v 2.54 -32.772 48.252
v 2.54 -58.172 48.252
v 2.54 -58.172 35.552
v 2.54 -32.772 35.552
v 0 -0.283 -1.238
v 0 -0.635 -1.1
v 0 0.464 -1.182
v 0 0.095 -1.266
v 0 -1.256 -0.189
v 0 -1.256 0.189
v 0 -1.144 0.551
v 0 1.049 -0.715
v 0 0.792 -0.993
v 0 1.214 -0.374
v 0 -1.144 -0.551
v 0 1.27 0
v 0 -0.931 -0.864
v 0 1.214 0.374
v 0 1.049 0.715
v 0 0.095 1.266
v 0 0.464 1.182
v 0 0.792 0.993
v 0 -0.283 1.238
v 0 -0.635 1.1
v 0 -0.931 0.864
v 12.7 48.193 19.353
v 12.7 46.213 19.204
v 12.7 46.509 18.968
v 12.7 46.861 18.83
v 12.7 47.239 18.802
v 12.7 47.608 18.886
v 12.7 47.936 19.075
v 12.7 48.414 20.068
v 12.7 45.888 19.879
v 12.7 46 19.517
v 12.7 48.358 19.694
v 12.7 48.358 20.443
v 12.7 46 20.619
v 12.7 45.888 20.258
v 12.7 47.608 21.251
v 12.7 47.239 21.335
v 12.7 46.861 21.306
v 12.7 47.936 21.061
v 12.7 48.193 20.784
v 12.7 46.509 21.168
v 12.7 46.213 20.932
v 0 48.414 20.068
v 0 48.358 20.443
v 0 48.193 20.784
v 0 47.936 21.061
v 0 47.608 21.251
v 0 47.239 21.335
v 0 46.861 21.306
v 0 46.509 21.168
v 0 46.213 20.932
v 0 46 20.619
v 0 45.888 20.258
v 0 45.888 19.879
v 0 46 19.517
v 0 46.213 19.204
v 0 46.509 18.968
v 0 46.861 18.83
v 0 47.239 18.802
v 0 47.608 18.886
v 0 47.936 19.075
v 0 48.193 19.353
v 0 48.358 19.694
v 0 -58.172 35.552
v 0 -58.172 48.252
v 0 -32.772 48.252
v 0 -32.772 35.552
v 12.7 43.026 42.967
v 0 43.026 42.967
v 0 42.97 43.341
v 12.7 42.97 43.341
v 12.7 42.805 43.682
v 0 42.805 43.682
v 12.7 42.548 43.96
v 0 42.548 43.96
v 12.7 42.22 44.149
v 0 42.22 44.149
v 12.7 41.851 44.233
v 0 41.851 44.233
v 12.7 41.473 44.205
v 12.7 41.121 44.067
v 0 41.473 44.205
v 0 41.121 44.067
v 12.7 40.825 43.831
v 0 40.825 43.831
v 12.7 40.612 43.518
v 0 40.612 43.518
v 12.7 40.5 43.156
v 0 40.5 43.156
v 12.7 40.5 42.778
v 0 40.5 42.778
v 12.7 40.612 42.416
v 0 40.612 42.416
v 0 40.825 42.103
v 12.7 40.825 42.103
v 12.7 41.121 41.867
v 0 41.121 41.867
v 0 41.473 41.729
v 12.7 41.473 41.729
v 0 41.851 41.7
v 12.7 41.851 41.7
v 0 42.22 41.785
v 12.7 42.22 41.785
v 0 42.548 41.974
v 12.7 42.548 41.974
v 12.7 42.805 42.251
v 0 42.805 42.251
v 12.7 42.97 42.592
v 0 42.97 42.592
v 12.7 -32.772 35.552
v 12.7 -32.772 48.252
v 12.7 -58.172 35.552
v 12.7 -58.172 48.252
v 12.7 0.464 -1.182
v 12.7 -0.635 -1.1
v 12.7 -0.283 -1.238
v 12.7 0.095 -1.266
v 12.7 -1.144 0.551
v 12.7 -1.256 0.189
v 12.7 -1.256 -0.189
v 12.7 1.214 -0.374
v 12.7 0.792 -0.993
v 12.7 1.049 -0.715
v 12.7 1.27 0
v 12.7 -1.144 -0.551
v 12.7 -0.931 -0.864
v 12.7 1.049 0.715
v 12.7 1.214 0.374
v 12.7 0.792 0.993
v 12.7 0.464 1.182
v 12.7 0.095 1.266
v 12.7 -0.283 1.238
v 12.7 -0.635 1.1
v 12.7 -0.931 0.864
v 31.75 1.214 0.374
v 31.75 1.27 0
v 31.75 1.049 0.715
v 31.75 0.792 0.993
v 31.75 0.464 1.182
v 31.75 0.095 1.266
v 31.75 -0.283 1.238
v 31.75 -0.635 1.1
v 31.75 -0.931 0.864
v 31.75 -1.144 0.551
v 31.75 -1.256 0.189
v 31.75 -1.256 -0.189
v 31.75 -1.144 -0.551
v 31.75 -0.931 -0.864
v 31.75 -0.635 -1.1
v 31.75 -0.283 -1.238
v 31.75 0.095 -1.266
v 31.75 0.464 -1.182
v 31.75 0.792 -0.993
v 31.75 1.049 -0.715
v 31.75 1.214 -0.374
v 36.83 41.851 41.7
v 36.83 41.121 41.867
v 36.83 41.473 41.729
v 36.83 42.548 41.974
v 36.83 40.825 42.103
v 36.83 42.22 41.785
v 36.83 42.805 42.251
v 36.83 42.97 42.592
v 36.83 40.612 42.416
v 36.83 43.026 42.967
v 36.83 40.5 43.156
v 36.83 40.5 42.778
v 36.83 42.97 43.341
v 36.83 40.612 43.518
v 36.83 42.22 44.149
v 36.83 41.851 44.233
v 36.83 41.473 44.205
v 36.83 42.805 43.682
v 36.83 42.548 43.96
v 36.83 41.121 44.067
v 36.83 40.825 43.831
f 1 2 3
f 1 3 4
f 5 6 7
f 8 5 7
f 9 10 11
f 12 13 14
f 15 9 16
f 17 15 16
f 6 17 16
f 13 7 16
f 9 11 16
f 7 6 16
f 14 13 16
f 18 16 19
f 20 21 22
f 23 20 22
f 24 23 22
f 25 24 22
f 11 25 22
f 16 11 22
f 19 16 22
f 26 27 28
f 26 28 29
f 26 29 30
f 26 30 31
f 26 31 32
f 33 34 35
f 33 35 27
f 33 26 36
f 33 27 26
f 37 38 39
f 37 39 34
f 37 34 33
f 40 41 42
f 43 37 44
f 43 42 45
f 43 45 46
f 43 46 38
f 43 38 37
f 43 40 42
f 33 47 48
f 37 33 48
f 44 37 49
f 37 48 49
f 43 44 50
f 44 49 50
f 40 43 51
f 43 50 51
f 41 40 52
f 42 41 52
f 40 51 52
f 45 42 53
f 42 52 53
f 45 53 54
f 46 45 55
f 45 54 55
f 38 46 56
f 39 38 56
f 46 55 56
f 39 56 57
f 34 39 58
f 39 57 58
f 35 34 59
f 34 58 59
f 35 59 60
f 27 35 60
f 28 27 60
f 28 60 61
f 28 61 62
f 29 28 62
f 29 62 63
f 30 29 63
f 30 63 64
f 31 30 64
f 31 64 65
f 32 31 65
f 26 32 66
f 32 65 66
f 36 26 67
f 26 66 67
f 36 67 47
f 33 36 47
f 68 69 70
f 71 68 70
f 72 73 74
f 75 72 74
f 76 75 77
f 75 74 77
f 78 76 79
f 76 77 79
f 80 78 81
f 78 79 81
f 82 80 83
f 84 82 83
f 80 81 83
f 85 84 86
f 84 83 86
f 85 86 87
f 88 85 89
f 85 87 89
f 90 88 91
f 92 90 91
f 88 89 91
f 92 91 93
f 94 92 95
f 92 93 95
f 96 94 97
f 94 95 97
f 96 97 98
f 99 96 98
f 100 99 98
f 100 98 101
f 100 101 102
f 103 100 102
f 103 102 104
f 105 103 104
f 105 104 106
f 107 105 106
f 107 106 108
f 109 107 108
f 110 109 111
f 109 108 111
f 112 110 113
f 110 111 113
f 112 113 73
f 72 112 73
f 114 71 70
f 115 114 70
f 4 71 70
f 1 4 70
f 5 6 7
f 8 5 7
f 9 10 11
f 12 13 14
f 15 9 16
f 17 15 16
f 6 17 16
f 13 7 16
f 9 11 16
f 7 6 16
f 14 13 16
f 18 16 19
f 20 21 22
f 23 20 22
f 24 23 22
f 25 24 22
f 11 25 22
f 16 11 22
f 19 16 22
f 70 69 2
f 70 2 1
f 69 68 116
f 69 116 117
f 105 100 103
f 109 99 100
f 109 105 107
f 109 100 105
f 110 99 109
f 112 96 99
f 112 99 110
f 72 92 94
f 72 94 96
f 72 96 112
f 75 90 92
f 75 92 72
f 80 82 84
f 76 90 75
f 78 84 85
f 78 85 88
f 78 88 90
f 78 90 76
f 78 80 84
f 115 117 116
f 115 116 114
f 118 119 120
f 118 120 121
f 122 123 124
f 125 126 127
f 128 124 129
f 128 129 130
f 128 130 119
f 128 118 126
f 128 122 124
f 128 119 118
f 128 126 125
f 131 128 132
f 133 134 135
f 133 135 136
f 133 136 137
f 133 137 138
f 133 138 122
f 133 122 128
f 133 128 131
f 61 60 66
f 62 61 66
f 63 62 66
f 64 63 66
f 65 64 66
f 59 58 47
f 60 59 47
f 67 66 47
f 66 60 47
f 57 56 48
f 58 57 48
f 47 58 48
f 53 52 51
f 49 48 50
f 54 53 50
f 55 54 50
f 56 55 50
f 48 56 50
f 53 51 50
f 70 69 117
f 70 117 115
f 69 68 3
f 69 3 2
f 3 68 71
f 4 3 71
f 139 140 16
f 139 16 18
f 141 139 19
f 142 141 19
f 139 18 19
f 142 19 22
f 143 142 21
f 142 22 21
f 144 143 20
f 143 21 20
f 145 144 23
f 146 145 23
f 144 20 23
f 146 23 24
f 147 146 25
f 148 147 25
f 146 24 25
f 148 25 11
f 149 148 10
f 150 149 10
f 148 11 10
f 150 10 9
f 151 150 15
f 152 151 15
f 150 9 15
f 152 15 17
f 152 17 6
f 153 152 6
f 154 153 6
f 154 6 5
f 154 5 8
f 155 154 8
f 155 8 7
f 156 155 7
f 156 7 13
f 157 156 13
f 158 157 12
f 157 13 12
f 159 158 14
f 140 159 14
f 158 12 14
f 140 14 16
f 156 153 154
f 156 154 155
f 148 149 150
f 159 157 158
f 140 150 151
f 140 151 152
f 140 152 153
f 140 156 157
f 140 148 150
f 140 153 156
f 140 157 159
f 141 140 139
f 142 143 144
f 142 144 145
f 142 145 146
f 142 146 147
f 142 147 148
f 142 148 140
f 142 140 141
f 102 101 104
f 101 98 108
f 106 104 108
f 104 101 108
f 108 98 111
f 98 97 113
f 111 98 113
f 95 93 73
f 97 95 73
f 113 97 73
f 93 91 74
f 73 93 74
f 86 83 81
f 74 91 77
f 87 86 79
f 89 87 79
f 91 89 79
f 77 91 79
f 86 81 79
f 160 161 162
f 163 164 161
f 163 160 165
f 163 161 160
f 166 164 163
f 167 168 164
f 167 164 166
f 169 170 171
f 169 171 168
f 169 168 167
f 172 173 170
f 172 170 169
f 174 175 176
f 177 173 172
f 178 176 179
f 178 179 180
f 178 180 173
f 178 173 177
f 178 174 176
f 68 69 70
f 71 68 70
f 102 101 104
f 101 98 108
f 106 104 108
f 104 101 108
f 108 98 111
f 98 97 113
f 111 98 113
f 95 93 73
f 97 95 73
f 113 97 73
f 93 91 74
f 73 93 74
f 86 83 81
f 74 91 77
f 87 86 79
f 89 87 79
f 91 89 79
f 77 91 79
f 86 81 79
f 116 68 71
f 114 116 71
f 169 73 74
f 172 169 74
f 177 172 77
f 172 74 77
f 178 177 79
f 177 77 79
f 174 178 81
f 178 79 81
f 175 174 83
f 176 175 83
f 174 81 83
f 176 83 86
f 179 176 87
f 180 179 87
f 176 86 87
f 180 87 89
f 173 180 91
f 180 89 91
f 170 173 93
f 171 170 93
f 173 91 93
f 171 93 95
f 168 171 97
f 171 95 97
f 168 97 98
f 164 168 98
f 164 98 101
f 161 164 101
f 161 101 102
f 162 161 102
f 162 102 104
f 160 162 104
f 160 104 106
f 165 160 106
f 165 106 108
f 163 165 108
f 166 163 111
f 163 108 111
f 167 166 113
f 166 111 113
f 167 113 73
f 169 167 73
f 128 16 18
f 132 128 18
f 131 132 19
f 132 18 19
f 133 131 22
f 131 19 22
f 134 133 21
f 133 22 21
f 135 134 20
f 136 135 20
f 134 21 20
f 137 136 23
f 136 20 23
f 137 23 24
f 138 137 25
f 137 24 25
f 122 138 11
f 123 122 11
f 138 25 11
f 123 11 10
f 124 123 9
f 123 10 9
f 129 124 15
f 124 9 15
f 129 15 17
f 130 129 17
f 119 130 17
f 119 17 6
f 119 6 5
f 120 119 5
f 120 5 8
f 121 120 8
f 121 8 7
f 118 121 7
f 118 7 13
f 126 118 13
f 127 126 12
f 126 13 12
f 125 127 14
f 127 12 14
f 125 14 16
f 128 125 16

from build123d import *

# Parameters (mm, degrees)
F0_R     = 1.27
F1_DEPTH = 31.75
F2_DEPTH = 36.83
F0_W     = 25.4
F0_H     = 12.7
F3_DEPTH = 2.54
F4_DEPTH = 12.7


with BuildPart() as f1:
    # F0 (on Right) → F1 (new body)
    with BuildSketch(Plane.YZ):
        Circle(F0_R)
    extrude(amount=F1_DEPTH)


with BuildPart() as f2:
    # F0 (on Right) → F2 (new body)
    with BuildSketch(Plane.YZ):
        with Locations((41.75606, 42.966802)):
            Circle(F0_R)
    extrude(amount=F2_DEPTH)


with BuildPart() as f3:
    # F0 (on Right) → F3 (new body)
    with BuildSketch(Plane.YZ):
        with Locations((-45.472408, 41.902002)):
            Rectangle(F0_W, F0_H)
    extrude(amount=F3_DEPTH)


with BuildPart() as f4:
    # F0 (on Right) → F4 (new body)
    with BuildSketch(Plane.YZ):
        Circle(F0_R)
        with Locations((41.75606, 42.966802)):
            Circle(F0_R)
        with Locations((-45.472408, 41.902002)):
            Rectangle(F0_W, F0_H)
        with Locations((47.14394, 20.068318)):
            Circle(F0_R)
    extrude(amount=F4_DEPTH)


solid = Compound([f1.part, f2.part, f3.part, f4.part])
